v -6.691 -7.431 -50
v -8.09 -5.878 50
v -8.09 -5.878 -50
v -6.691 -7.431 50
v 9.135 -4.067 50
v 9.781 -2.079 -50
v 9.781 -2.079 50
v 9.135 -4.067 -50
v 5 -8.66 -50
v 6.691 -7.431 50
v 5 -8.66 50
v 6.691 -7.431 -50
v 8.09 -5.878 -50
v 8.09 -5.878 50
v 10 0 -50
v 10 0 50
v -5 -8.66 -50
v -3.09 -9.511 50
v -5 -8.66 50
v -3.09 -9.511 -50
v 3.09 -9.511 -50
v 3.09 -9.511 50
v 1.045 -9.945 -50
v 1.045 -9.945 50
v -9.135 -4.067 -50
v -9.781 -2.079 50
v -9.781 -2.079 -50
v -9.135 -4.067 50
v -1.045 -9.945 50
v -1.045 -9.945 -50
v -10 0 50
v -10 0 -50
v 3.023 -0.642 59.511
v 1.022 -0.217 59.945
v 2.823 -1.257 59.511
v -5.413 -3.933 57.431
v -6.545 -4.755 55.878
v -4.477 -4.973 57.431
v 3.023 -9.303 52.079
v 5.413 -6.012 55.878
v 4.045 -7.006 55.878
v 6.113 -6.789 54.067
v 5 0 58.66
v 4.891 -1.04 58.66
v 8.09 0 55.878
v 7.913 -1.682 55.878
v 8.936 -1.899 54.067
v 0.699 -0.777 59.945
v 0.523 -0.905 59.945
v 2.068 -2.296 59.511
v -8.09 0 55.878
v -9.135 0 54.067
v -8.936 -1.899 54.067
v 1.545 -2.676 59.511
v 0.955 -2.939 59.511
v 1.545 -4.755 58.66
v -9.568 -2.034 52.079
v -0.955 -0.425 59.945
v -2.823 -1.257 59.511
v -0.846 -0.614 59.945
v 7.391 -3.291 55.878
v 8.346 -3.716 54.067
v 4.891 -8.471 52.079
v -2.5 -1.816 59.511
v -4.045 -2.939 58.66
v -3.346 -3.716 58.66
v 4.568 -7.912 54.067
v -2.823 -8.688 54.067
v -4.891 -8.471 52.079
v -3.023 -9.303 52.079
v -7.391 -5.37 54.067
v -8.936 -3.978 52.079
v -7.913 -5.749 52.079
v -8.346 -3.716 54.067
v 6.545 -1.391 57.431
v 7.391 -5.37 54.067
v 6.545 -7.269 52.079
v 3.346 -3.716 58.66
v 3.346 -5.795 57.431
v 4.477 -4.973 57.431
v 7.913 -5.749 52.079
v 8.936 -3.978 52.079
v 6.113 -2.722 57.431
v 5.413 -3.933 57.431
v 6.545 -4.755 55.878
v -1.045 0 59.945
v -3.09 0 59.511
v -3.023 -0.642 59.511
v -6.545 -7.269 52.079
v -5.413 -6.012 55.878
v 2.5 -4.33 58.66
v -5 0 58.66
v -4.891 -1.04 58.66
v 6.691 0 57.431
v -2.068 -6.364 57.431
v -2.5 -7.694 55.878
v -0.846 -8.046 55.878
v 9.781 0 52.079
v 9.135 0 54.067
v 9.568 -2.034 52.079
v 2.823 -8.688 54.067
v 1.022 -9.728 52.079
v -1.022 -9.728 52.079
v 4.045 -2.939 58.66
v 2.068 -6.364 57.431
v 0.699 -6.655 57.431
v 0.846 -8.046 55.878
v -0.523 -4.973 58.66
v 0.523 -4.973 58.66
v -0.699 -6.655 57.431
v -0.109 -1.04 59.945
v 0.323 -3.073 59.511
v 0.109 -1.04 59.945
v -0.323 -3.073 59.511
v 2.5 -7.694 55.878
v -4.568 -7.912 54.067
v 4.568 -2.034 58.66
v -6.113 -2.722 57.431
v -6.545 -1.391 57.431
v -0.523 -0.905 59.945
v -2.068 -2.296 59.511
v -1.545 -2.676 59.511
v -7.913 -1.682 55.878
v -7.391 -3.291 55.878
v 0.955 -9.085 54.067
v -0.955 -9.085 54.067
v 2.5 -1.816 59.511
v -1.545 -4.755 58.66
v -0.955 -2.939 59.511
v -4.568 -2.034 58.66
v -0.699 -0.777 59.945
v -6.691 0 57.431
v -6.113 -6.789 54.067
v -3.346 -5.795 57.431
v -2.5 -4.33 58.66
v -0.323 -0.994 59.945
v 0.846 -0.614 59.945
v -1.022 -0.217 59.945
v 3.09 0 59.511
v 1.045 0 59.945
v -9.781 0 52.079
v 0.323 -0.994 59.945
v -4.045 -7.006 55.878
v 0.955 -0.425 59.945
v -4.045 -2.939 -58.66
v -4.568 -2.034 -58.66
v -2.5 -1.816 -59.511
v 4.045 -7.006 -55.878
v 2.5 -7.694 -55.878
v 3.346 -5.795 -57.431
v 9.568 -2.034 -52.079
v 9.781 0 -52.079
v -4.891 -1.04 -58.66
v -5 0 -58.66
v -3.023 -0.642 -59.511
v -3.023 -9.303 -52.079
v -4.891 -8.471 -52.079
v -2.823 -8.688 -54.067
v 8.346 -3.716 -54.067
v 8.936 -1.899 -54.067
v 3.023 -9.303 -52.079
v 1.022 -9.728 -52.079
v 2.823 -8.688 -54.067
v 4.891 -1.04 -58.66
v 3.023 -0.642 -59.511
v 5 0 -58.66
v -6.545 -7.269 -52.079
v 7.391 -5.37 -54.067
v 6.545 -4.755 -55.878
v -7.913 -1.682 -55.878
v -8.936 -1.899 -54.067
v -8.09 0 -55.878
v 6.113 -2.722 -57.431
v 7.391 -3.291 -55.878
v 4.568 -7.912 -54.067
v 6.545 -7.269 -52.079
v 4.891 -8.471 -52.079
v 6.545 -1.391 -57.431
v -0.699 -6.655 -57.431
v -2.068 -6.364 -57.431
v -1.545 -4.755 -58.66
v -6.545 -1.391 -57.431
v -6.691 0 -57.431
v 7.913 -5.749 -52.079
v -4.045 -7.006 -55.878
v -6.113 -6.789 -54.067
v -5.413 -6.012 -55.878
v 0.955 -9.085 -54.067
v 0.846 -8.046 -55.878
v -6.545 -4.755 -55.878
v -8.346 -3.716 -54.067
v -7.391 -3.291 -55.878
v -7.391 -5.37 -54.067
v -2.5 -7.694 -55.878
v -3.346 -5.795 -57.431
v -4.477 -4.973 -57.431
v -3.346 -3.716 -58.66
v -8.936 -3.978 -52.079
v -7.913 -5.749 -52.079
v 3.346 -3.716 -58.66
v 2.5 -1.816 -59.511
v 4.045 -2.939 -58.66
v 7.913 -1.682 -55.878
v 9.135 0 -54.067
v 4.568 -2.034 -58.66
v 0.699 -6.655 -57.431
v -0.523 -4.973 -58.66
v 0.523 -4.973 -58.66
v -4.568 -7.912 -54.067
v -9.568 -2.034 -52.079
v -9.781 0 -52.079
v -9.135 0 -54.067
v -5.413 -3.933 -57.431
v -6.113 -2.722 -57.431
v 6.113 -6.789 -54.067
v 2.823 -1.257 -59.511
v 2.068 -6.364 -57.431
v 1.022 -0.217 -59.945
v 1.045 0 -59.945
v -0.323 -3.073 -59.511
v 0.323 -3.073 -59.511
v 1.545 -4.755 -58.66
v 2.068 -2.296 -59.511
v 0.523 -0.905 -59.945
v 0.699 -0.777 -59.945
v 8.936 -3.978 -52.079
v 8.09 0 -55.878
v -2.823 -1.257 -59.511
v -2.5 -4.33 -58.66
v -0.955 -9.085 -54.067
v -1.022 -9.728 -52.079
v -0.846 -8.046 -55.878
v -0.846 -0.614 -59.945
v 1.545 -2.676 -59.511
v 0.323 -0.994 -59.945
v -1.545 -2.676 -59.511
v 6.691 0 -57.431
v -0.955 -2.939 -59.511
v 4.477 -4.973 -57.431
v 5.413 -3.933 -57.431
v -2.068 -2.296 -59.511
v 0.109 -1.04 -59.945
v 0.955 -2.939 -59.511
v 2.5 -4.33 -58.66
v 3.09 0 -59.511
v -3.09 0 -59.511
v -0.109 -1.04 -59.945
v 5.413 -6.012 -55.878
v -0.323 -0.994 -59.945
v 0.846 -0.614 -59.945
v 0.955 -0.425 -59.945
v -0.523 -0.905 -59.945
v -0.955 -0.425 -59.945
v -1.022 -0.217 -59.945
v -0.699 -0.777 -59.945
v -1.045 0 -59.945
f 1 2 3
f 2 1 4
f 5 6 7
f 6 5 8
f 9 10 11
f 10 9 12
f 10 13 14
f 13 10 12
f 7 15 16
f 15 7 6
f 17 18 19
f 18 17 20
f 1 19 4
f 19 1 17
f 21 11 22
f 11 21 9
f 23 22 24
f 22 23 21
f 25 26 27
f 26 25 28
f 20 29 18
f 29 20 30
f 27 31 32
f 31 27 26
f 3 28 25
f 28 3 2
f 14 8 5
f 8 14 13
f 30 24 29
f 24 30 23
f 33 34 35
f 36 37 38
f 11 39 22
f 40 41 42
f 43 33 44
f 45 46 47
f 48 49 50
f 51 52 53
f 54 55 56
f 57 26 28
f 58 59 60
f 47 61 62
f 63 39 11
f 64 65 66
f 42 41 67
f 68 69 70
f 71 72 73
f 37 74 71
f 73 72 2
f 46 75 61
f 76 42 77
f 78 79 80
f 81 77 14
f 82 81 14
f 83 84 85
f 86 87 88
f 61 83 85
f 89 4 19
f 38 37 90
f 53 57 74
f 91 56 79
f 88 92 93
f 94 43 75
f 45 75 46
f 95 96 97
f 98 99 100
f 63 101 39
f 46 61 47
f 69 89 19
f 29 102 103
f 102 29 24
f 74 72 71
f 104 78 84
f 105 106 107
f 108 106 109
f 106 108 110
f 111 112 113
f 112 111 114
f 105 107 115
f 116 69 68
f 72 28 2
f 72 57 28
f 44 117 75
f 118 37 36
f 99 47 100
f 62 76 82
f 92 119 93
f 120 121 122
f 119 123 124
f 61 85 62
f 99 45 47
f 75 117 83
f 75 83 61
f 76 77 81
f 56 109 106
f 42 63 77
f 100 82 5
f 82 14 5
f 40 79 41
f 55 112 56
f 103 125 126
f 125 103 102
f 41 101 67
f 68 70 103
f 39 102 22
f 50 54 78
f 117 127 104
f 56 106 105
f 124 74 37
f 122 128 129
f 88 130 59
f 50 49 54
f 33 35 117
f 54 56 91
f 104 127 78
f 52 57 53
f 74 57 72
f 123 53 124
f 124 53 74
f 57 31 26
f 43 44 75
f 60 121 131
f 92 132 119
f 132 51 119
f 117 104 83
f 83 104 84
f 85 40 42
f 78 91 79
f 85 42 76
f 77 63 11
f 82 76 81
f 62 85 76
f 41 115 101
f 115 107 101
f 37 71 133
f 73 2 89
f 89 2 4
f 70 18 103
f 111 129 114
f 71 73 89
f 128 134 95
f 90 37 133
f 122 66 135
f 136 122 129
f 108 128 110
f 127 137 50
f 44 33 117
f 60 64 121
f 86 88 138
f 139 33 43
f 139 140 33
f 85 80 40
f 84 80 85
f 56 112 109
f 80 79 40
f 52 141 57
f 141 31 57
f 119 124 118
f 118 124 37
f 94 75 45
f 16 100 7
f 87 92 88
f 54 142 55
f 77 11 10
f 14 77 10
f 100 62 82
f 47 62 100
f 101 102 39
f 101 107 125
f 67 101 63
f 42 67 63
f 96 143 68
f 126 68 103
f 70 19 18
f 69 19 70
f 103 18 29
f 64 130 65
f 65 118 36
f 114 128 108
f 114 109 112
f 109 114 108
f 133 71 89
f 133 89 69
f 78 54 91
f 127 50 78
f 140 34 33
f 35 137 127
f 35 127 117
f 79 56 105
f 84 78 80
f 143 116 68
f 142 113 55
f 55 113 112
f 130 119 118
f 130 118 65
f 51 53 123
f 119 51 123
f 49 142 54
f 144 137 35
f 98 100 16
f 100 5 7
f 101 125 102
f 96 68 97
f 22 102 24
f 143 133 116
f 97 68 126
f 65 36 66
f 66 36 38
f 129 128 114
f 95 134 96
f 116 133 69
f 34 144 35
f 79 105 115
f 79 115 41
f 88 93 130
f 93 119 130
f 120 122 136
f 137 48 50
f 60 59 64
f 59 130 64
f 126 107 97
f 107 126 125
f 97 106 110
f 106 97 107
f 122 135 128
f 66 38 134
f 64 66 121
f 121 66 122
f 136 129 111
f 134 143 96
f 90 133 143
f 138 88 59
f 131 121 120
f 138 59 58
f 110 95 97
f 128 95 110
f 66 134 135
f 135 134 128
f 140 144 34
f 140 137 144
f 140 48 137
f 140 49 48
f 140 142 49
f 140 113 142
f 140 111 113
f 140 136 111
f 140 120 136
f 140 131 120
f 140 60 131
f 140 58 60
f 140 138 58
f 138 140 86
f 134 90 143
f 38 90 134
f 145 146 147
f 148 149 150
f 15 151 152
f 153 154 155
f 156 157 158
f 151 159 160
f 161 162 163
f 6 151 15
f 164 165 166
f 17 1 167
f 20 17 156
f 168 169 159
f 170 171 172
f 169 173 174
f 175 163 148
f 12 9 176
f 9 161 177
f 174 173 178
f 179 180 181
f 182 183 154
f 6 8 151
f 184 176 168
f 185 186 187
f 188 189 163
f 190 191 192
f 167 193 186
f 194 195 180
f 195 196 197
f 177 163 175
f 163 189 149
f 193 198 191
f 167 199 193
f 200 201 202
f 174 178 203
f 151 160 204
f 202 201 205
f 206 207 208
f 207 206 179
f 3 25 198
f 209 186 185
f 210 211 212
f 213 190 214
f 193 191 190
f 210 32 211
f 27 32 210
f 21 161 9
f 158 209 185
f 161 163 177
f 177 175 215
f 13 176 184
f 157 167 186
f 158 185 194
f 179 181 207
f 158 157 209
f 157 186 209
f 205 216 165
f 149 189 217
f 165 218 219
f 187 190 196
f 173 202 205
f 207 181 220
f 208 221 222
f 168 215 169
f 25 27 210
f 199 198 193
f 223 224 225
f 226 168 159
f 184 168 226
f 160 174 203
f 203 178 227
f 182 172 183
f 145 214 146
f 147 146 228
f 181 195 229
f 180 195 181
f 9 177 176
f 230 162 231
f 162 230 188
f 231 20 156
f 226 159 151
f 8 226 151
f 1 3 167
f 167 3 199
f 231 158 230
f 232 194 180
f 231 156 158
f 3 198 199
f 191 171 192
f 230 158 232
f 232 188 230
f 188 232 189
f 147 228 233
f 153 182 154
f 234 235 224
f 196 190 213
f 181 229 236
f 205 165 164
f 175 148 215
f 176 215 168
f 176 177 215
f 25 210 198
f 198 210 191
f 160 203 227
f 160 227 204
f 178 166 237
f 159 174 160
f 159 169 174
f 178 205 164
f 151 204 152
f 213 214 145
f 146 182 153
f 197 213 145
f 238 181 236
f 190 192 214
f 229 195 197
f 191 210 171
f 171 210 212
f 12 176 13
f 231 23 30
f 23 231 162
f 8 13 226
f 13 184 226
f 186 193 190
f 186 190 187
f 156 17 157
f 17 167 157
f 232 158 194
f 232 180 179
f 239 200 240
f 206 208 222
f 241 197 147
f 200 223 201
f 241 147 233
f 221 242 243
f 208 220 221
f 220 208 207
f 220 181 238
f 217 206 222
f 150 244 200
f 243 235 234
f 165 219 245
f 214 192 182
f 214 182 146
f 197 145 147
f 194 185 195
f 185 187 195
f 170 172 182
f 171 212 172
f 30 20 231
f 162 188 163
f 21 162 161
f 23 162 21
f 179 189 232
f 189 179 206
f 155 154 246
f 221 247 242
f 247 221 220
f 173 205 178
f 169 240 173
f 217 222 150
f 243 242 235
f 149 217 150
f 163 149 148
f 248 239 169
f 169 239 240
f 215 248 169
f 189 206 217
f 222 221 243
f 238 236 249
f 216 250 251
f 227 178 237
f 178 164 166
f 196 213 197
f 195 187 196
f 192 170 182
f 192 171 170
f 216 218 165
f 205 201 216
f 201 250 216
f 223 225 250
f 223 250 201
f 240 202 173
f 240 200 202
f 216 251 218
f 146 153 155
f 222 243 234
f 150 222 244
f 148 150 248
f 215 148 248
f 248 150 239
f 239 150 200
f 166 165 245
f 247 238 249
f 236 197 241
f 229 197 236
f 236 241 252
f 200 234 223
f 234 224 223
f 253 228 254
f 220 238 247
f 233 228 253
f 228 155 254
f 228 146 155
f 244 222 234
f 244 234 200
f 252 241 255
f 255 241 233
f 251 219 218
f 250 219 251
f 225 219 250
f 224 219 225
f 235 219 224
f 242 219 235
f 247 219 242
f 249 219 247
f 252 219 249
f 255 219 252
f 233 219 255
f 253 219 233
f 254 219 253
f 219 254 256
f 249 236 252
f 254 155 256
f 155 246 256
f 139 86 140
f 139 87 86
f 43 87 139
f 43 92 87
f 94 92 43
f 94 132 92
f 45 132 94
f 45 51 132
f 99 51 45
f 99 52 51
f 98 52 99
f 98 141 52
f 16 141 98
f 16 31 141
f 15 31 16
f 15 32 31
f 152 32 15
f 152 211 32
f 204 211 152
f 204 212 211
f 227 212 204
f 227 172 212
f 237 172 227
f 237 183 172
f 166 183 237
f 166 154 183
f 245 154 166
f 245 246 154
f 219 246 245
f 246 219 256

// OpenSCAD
module renfort( h=100, r=10) {

difference() 
{
union() {
cylinder(r=r,h=h, center=true);

translate([ 0, 0, h/2])
sphere(r=r);

translate([ 0, 0, -h/2])
sphere(r=r);
}

hh=h*2;

color("red")
translate([ -r, 0, -hh/2])
cube([ 2*r, 2*r, hh]);
}

}

renfort();
